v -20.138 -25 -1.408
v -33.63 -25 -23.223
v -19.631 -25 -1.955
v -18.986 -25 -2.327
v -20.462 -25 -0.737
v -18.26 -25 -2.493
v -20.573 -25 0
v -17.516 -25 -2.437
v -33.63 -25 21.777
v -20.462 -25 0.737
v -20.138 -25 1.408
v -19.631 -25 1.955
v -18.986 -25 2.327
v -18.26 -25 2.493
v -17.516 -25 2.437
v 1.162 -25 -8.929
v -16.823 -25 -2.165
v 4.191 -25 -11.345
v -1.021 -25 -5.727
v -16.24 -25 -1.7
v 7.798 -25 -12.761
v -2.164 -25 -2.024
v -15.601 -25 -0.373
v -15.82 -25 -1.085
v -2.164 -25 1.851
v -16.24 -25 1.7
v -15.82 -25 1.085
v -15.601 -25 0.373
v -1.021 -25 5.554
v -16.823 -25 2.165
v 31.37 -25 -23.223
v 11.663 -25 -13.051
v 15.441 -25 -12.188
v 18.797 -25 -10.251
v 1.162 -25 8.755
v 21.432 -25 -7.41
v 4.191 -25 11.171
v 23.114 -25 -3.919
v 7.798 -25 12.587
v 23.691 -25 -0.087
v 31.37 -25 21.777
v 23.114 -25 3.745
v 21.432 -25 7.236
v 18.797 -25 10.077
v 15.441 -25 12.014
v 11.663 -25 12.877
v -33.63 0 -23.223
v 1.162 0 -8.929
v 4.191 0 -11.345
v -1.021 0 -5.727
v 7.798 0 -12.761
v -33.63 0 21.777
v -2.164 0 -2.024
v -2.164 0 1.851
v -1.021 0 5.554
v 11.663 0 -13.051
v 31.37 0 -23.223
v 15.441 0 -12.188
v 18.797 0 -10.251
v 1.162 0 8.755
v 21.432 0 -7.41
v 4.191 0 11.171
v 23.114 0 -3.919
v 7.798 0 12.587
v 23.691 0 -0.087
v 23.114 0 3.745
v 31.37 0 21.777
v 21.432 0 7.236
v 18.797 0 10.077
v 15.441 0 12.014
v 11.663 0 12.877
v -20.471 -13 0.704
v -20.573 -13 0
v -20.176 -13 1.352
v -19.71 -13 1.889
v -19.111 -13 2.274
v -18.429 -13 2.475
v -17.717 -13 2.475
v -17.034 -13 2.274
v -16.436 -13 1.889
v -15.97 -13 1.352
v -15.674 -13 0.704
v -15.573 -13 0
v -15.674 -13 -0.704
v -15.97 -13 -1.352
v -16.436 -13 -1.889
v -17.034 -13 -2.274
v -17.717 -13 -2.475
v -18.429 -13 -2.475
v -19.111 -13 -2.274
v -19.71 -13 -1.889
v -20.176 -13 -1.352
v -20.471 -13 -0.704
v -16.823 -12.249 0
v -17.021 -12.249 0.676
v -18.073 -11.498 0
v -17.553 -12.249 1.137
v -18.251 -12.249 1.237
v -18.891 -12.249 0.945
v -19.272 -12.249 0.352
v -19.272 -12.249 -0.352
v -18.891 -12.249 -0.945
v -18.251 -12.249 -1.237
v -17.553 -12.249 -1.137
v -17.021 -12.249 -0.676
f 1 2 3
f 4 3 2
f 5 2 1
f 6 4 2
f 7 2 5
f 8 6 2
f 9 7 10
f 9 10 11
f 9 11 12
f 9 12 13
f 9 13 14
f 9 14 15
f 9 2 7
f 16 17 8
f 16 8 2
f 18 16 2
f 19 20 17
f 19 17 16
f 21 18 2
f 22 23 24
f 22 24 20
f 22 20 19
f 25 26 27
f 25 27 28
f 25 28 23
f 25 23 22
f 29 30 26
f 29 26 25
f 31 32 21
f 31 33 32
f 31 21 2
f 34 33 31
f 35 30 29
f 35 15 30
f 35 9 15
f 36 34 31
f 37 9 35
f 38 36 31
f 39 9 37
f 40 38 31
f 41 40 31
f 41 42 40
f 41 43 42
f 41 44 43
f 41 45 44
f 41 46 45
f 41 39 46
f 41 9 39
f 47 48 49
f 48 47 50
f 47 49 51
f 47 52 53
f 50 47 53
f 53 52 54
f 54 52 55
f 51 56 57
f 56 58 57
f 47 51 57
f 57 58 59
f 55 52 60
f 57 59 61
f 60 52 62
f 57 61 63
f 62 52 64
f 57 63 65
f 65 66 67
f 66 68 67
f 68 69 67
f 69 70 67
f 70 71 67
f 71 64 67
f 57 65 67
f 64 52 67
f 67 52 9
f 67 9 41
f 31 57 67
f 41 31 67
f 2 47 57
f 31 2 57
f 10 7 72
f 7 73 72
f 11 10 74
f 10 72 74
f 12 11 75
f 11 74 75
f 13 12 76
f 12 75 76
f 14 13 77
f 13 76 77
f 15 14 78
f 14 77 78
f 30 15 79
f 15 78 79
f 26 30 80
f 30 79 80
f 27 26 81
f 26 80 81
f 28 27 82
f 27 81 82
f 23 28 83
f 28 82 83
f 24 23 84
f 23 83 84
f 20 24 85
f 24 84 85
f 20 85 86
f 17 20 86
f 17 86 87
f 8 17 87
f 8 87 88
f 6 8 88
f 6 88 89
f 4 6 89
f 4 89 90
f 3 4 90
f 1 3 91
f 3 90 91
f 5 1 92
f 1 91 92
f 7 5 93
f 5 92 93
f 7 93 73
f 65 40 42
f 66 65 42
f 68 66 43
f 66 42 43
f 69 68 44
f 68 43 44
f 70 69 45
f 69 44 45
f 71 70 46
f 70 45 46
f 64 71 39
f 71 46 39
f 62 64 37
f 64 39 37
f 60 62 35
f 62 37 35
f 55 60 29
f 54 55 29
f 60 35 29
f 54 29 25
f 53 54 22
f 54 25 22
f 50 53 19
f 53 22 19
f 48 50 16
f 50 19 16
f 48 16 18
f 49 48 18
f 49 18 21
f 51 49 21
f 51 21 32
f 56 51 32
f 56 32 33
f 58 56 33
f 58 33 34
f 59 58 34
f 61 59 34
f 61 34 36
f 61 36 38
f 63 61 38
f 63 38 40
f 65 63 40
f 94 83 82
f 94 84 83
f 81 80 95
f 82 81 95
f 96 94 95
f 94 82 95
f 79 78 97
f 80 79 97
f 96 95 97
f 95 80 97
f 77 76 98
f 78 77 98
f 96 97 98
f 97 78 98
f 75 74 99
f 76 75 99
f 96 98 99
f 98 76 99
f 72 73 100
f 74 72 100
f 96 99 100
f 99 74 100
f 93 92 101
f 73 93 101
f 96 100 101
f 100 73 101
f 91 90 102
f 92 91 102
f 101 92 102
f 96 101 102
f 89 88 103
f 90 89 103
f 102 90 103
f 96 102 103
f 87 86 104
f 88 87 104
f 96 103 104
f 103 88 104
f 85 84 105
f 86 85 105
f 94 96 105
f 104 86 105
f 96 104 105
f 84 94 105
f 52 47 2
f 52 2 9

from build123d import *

# Parameters (mm, degrees)
F0_W     = 65
F0_H     = 45
F1_DEPTH = 25
F3_D     = 5
F3_DEPTH = 12
F3_TIP   = 1.5021515476
F4_R     = 13
F5_DEPTH = 25.001


with BuildPart() as f1:
    # F0 (on Front) → F1 (new body)
    with BuildSketch(Plane.XZ):
        with Locations((-1.1299671605, -0.7227190264)):
            Rectangle(F0_W, F0_H)
    extrude(amount=F1_DEPTH)

    # F3
    with Locations(Plane.XZ.offset(25)):
        with Locations((-18.0727501515, 0)):
            Hole(F3_D / 2, depth=F3_DEPTH)
            with Locations((0, 0, -(F3_DEPTH + F3_TIP / 2))):  # 118° drill point
                Cone(0, F3_D / 2, F3_TIP, mode=Mode.SUBTRACT)

    # F4 (on face) → F5 (cut, through all)
    with BuildSketch(Plane.XZ.offset(25)):
        with Locations((10.6912245974, -0.0869205323)):
            Circle(F4_R)
    extrude(amount=-F5_DEPTH, mode=Mode.SUBTRACT)


solid = f1.part
